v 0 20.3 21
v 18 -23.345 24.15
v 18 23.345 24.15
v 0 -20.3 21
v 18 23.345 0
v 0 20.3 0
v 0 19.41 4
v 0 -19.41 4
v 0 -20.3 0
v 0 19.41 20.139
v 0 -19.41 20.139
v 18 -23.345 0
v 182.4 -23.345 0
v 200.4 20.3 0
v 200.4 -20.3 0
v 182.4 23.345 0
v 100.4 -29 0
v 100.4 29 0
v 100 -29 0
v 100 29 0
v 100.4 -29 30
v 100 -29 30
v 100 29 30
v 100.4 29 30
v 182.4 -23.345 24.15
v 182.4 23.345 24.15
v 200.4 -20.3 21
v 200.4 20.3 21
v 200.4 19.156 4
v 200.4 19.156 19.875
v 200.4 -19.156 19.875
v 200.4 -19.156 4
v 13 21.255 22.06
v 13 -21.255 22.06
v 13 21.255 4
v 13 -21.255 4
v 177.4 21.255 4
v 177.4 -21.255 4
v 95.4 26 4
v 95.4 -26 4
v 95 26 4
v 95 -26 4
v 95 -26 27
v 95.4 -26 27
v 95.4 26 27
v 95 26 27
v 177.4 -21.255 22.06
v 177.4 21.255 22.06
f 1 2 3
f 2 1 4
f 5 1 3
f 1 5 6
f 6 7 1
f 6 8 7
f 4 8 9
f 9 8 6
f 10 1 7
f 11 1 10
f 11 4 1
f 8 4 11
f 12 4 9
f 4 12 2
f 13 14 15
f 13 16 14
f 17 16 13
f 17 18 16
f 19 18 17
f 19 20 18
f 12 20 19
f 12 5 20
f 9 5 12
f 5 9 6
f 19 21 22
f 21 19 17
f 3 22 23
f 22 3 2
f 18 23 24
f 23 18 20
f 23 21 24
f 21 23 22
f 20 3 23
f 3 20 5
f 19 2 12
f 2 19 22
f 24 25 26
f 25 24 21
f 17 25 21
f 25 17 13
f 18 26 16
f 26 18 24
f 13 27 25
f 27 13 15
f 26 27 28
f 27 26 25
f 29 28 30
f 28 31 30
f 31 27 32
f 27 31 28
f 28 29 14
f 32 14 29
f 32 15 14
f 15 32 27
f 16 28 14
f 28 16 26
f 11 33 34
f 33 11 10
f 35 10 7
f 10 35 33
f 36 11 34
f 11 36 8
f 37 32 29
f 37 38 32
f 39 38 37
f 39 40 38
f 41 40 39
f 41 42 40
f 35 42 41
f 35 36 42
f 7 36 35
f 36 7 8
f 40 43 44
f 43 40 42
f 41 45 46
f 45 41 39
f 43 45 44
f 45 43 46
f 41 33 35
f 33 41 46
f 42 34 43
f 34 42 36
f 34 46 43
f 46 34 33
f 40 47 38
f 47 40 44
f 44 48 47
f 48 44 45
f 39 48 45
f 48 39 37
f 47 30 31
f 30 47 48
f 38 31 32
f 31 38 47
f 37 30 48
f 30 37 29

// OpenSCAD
$fn = 32;

// ----------------------------------------------------------------------
// Faired channel: 200 x 58 x 30 mm, 3 mm walls, faired ends
// ----------------------------------------------------------------------

// --- parameters (mm) ---
length = 200;             // channel length
width = 58;               // channel width at mid length
height = 30;              // channel height at mid length
wall = 3;                 // side wall thickness
floor_t = 4;              // floor thickness
end_w = 40.6;             // faired end width
end_h = 21;               // faired end height

difference() {
  union() {
    hull() {
      translate([0, -20.3, 0]) cube([0.4, 40.6, 21]);
      translate([18, -23.345, 0]) cube([0.4, 46.69, 24.15]);
    }
    hull() {
      translate([18, -23.345, 0]) cube([0.4, 46.69, 24.15]);
      translate([100, -29, 0]) cube([0.4, 58, 30]);
    }
    hull() {
      translate([100, -29, 0]) cube([0.4, 58, 30]);
      translate([182, -23.345, 0]) cube([0.4, 46.69, 24.15]);
    }
    hull() {
      translate([182, -23.345, 0]) cube([0.4, 46.69, 24.15]);
      translate([200, -20.3, 0]) cube([0.4, 40.6, 21]);
    }
  }
  /* cavity, 5 mm proud of both ends so the ports are cut clean */
  hull() {
    translate([-5, -18.7, 4]) cube([0.4, 37.4, 15.4]);
    translate([13, -21.255, 4]) cube([0.4, 42.51, 18.06]);
  }
  hull() {
    translate([13, -21.255, 4]) cube([0.4, 42.51, 18.06]);
    translate([95, -26, 4]) cube([0.4, 52, 23]);
  }
  hull() {
    translate([95, -26, 4]) cube([0.4, 52, 23]);
    translate([177, -21.255, 4]) cube([0.4, 42.51, 18.06]);
  }
  hull() {
    translate([177, -21.255, 4]) cube([0.4, 42.51, 18.06]);
    translate([205, -18.7, 4]) cube([0.4, 37.4, 15.4]);
  }
}
